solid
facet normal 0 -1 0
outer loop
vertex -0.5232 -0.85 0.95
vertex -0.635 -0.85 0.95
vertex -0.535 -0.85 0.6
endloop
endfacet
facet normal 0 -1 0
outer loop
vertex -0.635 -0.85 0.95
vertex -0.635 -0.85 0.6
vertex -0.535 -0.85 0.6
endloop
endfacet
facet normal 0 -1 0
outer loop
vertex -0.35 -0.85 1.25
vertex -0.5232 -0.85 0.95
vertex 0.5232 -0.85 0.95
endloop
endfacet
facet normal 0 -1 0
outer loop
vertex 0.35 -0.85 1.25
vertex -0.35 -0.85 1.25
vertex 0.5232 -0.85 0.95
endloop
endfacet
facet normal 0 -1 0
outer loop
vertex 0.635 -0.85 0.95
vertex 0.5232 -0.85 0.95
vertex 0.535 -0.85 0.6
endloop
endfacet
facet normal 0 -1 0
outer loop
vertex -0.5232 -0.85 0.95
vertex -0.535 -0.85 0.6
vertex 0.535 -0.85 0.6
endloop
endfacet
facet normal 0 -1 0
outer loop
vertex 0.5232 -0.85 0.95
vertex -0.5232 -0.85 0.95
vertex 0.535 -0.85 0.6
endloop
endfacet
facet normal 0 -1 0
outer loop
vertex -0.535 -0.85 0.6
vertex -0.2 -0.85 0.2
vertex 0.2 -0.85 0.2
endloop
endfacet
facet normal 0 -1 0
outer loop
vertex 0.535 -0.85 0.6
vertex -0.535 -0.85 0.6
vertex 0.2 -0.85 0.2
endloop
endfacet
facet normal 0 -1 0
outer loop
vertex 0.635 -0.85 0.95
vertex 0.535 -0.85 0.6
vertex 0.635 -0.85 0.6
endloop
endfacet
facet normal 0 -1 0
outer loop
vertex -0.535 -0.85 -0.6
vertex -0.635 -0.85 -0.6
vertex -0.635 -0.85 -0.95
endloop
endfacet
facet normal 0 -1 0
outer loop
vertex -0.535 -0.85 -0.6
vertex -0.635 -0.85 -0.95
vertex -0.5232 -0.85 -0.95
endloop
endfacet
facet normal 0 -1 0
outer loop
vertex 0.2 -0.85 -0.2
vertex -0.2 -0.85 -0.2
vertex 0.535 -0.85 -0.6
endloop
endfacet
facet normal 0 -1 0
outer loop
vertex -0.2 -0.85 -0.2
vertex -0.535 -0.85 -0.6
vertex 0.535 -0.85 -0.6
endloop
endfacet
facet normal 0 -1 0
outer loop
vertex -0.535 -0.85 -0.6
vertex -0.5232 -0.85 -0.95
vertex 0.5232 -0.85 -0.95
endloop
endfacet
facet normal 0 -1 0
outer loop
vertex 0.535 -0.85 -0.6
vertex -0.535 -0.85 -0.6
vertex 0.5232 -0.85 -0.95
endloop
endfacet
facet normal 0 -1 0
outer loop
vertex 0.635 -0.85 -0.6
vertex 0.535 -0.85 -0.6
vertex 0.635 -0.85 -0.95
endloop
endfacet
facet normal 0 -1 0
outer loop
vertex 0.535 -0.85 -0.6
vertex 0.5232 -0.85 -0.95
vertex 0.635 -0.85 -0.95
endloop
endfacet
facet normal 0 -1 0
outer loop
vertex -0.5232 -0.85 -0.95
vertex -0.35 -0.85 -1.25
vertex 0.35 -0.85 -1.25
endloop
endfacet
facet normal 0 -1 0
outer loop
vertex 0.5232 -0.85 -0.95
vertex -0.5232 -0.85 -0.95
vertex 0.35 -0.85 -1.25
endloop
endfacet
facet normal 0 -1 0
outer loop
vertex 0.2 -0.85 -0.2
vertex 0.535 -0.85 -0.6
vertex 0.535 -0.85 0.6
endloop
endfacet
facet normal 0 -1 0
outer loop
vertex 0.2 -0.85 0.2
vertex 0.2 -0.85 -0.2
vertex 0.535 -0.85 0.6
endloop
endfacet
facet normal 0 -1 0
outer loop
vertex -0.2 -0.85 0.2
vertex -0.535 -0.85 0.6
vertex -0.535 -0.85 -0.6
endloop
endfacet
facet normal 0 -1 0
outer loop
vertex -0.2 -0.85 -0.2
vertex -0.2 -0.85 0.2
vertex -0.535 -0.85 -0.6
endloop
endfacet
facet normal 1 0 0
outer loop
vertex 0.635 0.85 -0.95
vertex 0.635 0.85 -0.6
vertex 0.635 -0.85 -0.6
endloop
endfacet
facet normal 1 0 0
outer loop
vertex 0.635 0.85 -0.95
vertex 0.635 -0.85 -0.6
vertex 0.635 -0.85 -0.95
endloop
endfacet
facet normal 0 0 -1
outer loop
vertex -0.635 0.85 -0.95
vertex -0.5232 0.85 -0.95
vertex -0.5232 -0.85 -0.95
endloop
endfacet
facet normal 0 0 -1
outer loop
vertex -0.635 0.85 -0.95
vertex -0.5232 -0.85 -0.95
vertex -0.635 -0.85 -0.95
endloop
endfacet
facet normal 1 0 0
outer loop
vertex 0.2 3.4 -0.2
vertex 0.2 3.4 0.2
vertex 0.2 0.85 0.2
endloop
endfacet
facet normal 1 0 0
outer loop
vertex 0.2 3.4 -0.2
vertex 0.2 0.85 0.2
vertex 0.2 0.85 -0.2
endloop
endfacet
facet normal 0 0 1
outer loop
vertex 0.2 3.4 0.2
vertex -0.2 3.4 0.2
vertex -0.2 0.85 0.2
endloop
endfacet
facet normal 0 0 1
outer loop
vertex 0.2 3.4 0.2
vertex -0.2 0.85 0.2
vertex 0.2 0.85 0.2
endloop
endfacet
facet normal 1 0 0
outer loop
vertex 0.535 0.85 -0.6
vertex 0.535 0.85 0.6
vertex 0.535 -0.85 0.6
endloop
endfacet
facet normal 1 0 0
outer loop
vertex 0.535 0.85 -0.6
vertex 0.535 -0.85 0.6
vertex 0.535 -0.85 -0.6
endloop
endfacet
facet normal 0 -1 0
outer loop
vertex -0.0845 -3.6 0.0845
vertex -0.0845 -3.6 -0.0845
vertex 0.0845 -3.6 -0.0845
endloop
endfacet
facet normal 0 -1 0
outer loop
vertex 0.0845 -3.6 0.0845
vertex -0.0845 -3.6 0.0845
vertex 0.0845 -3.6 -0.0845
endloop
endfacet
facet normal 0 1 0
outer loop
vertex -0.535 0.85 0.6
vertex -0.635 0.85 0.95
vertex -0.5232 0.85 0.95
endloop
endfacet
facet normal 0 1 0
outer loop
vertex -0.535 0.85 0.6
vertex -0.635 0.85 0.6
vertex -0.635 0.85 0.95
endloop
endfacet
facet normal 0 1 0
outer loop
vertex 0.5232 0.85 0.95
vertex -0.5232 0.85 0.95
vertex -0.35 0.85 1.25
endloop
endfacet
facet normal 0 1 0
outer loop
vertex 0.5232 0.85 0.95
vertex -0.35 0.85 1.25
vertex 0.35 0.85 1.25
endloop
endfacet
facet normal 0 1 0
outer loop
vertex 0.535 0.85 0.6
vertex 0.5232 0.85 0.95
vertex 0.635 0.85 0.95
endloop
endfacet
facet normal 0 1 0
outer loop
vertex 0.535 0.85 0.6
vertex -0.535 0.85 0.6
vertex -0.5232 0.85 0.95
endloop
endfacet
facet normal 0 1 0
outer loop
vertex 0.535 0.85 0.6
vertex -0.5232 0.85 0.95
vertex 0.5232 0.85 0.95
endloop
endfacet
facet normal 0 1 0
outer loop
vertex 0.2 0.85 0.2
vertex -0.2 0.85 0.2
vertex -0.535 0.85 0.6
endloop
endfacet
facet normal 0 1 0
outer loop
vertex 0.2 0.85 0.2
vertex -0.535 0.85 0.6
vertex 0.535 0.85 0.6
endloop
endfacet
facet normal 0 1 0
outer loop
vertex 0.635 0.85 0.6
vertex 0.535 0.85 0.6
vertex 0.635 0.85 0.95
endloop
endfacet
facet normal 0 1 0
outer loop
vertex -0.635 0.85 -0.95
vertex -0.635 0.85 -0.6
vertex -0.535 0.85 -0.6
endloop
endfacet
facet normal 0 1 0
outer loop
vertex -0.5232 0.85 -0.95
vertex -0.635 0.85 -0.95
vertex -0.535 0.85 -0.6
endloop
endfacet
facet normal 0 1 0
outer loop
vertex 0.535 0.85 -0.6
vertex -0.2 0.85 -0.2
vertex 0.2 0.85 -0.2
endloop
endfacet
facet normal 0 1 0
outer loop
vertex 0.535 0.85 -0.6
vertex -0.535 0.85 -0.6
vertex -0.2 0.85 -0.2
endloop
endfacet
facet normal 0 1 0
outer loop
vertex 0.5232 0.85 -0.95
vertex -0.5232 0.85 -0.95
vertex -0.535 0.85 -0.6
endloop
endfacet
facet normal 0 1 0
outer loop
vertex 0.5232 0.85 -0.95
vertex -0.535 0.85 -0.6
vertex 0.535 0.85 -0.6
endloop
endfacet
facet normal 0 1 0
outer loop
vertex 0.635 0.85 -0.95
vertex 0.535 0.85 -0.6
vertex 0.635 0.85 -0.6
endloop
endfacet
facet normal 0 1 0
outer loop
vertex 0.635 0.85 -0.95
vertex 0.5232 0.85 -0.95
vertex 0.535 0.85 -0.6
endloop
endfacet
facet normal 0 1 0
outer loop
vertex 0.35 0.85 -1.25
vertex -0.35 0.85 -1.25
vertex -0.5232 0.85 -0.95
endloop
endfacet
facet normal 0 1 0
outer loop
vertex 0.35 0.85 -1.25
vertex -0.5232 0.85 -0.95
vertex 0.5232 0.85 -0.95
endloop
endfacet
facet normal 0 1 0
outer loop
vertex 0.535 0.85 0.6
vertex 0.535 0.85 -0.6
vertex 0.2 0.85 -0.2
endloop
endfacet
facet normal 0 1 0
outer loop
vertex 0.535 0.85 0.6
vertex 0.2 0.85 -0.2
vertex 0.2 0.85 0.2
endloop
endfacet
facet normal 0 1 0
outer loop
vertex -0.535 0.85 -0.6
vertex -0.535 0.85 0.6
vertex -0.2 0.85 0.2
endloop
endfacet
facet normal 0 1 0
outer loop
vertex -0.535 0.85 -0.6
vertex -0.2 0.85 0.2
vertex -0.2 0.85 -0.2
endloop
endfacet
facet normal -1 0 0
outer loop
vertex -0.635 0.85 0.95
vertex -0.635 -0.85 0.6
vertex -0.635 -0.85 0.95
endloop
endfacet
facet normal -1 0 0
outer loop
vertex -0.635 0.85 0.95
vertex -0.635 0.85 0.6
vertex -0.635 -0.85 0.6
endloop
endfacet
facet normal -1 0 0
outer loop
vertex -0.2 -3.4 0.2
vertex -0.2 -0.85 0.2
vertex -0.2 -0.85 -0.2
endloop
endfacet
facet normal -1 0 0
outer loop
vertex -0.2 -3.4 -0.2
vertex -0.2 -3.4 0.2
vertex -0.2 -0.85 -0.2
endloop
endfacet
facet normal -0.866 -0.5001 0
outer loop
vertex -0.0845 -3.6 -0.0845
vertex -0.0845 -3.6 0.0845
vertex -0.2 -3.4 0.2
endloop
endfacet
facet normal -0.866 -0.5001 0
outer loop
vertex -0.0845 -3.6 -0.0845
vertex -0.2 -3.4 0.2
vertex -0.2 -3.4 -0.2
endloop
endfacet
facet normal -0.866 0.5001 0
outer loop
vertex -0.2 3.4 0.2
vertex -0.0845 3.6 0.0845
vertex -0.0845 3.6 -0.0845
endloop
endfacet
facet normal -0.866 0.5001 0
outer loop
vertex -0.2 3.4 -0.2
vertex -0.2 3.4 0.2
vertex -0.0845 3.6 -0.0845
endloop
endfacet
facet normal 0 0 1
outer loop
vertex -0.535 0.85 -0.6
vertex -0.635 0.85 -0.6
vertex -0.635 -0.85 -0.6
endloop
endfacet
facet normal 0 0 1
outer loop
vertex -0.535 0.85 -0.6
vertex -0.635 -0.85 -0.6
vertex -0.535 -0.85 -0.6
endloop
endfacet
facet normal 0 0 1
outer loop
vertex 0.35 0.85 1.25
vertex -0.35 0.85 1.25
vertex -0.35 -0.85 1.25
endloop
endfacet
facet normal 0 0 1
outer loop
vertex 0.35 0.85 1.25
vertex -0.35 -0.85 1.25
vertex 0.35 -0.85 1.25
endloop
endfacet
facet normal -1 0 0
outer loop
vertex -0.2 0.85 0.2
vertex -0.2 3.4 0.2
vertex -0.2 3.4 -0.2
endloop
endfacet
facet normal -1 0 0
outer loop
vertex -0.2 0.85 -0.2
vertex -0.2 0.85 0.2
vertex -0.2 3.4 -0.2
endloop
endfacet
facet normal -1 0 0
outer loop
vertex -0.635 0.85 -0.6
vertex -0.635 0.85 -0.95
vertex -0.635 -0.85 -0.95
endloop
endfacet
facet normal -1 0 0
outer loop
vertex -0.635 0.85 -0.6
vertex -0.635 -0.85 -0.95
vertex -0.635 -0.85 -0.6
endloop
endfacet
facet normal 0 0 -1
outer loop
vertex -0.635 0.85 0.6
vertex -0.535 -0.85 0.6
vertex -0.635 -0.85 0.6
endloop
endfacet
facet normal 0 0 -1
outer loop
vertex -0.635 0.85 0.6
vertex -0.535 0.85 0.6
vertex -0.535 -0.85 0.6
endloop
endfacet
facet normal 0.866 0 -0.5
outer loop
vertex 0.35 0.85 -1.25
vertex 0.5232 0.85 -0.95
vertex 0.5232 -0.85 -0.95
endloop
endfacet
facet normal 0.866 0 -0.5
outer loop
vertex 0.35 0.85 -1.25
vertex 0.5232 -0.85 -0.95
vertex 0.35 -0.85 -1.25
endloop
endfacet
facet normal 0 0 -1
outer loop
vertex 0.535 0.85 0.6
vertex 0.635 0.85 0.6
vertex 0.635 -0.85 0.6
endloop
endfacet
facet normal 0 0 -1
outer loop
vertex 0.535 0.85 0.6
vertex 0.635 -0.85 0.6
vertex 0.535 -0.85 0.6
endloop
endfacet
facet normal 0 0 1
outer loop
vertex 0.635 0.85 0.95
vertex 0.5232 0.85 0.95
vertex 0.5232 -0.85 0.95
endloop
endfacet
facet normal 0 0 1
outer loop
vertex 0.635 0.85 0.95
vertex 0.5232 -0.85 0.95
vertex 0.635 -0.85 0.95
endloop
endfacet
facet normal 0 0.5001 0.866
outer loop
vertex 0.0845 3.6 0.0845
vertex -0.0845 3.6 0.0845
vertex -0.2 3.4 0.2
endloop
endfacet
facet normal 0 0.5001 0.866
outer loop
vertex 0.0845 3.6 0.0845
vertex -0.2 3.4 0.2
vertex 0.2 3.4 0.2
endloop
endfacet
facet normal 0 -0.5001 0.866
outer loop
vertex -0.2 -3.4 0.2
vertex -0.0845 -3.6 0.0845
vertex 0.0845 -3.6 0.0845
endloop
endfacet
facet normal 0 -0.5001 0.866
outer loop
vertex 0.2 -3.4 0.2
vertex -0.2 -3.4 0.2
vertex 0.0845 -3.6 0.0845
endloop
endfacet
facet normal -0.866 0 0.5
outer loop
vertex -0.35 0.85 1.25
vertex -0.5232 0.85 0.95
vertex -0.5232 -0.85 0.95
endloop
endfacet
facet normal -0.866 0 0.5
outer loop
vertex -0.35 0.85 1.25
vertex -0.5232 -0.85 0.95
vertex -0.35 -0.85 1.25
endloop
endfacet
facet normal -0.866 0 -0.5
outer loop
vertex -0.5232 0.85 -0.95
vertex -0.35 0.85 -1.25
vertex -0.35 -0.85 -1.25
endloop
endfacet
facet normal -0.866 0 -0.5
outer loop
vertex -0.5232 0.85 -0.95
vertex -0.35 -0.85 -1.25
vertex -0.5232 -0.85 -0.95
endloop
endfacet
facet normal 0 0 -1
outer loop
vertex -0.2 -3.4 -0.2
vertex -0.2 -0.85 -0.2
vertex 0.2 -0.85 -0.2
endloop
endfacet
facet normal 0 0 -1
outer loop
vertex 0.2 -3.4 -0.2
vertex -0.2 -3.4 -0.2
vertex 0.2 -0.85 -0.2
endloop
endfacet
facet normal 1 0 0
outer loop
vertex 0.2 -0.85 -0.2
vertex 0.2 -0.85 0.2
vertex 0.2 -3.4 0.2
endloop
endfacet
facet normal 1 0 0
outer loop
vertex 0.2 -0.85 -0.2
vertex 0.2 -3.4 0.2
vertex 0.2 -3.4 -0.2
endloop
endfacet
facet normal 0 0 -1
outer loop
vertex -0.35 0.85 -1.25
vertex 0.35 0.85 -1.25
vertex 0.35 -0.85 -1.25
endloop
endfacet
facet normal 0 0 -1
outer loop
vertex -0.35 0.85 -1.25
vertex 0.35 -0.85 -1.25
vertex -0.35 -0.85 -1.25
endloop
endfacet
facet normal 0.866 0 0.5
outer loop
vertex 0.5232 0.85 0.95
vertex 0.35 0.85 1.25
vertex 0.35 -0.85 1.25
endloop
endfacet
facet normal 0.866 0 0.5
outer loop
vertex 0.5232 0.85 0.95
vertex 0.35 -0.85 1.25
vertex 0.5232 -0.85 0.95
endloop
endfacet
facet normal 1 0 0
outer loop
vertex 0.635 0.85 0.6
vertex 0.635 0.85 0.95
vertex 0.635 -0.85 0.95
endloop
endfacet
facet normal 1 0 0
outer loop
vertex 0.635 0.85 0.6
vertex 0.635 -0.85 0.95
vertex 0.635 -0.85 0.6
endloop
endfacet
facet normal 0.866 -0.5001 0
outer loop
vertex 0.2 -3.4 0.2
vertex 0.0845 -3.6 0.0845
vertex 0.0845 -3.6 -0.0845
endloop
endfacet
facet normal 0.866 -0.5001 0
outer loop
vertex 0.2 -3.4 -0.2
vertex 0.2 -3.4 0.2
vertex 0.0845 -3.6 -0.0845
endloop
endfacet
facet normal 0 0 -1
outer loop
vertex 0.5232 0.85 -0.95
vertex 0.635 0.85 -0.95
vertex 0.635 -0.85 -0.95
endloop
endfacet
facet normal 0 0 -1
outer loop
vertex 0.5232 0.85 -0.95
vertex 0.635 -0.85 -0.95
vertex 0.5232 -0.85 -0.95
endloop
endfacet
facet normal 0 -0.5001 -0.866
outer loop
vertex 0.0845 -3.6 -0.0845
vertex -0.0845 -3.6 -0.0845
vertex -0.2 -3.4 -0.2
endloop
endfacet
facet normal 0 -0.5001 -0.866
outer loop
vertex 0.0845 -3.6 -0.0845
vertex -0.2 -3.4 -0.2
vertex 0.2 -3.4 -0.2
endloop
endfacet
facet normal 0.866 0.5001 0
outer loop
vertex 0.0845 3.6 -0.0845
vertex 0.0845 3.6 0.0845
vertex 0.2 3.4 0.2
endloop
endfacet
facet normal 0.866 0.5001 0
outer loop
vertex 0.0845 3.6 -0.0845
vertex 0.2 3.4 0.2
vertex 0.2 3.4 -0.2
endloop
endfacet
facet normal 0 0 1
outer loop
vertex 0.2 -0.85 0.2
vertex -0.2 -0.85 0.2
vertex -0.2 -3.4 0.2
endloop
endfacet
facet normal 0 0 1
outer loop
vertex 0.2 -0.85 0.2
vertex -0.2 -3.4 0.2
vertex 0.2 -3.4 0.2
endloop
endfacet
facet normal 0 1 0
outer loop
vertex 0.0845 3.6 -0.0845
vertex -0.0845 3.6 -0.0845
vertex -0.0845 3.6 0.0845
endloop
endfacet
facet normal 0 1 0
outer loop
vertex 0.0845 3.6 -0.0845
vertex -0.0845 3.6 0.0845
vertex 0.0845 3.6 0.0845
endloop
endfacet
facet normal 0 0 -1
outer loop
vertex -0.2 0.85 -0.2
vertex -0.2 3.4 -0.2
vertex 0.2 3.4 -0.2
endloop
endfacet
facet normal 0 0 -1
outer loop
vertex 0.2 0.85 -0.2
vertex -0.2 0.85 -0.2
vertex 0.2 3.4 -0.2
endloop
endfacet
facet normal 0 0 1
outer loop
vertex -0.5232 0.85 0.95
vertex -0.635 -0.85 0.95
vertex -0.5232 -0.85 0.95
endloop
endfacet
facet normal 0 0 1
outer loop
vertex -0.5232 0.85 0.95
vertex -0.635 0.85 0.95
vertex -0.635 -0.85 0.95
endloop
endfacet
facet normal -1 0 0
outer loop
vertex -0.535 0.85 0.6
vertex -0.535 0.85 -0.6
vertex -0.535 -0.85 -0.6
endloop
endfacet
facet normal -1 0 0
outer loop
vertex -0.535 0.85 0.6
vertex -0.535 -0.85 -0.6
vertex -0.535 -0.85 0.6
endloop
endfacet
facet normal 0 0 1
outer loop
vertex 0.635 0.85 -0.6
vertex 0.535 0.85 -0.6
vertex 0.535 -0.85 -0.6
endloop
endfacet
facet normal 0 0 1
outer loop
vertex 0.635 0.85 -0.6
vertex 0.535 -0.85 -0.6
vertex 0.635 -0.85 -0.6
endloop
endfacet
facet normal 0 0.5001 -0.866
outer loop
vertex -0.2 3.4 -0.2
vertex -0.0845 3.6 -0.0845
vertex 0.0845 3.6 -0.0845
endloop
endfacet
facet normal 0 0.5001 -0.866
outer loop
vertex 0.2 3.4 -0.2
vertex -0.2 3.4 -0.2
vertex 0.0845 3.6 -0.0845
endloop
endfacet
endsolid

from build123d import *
from OCP.BRepFilletAPI import BRepFilletAPI_MakeChamfer

# Parameters (mm, degrees)
EXTRUDE_1_DEPTH = 0.85
SKETCH_4_W      = 0.4
SKETCH_4_H      = 0.4
EXTRUDE_2_DEPTH = 3.6
CHAMFER_1_SIZE  = 0.2
CHAMFER_1_SIZE2 = 0.115470054
CHAMFER_2_SIZE  = 0.2
CHAMFER_2_SIZE2 = 0.115470054


with BuildPart() as part:
    # 草图1 → 凸台-拉伸1 (new, symmetric)
    with BuildSketch(Plane(origin=(0, 0, 0), x_dir=(1, 0, 0), z_dir=(0, 1, 0))):
        Polygon((-0.635, -0.95), (-0.523205081, -0.95), (-0.35, -1.25), (0.35, -1.25), (0.523205081, -0.95), (0.635, -0.95), (0.635, -0.6), (0.535, -0.6), (0.535, 0.6), (0.635, 0.6), (0.635, 0.95), (0.523205081, 0.95), (0.35, 1.25), (-0.35, 1.25), (-0.523205081, 0.95), (-0.635, 0.95), (-0.635, 0.6), (-0.535, 0.6), (-0.535, -0.6), (-0.635, -0.6), align=None)
    extrude(amount=EXTRUDE_1_DEPTH, both=True)

    # 草图4 → 凸台-拉伸2 (add, symmetric)
    with BuildSketch(Plane(origin=(0, 0, 0), x_dir=(1, 0, 0), z_dir=(0, 1, 0))):
        Rectangle(SKETCH_4_W, SKETCH_4_H)
    extrude(amount=EXTRUDE_2_DEPTH, both=True)

    # 倒角1: one chamfer whose edges measure the first distance from different faces: ONE call of the kernel's chamfer builder (chamfer() names one face for all edges)
    chamfer_1_edges_1 = [part.edges().sort_by_distance(p)[0] for p in [
        (-0.2, 3.6, 0),
    ]]
    chamfer_1_side_1 = [part.faces().sort_by_distance(p)[0] for p in [
        (-0.2, 2.225, 0),
    ]]
    chamfer_1_edges_2 = [part.edges().sort_by_distance(p)[0] for p in [
        (0, 3.6, 0.2),
    ]]
    chamfer_1_side_2 = [part.faces().sort_by_distance(p)[0] for p in [
        (0, 2.225, 0.2),
    ]]
    chamfer_1_edges_3 = [part.edges().sort_by_distance(p)[0] for p in [
        (0.2, 3.6, 0),
    ]]
    chamfer_1_side_3 = [part.faces().sort_by_distance(p)[0] for p in [
        (0.2, 2.225, 0),
    ]]
    chamfer_1_edges_4 = [part.edges().sort_by_distance(p)[0] for p in [
        (0, 3.6, -0.2),
    ]]
    chamfer_1_side_4 = [part.faces().sort_by_distance(p)[0] for p in [
        (0, 2.225, -0.2),
    ]]
    chamfer_1 = BRepFilletAPI_MakeChamfer(part.part.solid().wrapped)
    for e in chamfer_1_edges_1:
        chamfer_1.Add(CHAMFER_1_SIZE, CHAMFER_1_SIZE2, e.wrapped, chamfer_1_side_1[0].wrapped)  # the first distance lies on this face
    for e in chamfer_1_edges_2:
        chamfer_1.Add(CHAMFER_1_SIZE, CHAMFER_1_SIZE2, e.wrapped, chamfer_1_side_2[0].wrapped)  # the first distance lies on this face
    for e in chamfer_1_edges_3:
        chamfer_1.Add(CHAMFER_1_SIZE, CHAMFER_1_SIZE2, e.wrapped, chamfer_1_side_3[0].wrapped)  # the first distance lies on this face
    for e in chamfer_1_edges_4:
        chamfer_1.Add(CHAMFER_1_SIZE, CHAMFER_1_SIZE2, e.wrapped, chamfer_1_side_4[0].wrapped)  # the first distance lies on this face
    add(Compound.cast(chamfer_1.Shape()), mode=Mode.REPLACE)

    # 倒角2: one chamfer whose edges measure the first distance from different faces: ONE call of the kernel's chamfer builder (chamfer() names one face for all edges)
    chamfer_2_edges_1 = [part.edges().sort_by_distance(p)[0] for p in [
        (-0.2, -3.6, 0),
    ]]
    chamfer_2_side_1 = [part.faces().sort_by_distance(p)[0] for p in [
        (-0.2, -2.225, 0),
    ]]
    chamfer_2_edges_2 = [part.edges().sort_by_distance(p)[0] for p in [
        (0, -3.6, 0.2),
    ]]
    chamfer_2_side_2 = [part.faces().sort_by_distance(p)[0] for p in [
        (0, -2.225, 0.2),
    ]]
    chamfer_2_edges_3 = [part.edges().sort_by_distance(p)[0] for p in [
        (0.2, -3.6, 0),
    ]]
    chamfer_2_side_3 = [part.faces().sort_by_distance(p)[0] for p in [
        (0.2, -2.225, 0),
    ]]
    chamfer_2_edges_4 = [part.edges().sort_by_distance(p)[0] for p in [
        (0, -3.6, -0.2),
    ]]
    chamfer_2_side_4 = [part.faces().sort_by_distance(p)[0] for p in [
        (0, -2.225, -0.2),
    ]]
    chamfer_2 = BRepFilletAPI_MakeChamfer(part.part.solid().wrapped)
    for e in chamfer_2_edges_1:
        chamfer_2.Add(CHAMFER_2_SIZE, CHAMFER_2_SIZE2, e.wrapped, chamfer_2_side_1[0].wrapped)  # the first distance lies on this face
    for e in chamfer_2_edges_2:
        chamfer_2.Add(CHAMFER_2_SIZE, CHAMFER_2_SIZE2, e.wrapped, chamfer_2_side_2[0].wrapped)  # the first distance lies on this face
    for e in chamfer_2_edges_3:
        chamfer_2.Add(CHAMFER_2_SIZE, CHAMFER_2_SIZE2, e.wrapped, chamfer_2_side_3[0].wrapped)  # the first distance lies on this face
    for e in chamfer_2_edges_4:
        chamfer_2.Add(CHAMFER_2_SIZE, CHAMFER_2_SIZE2, e.wrapped, chamfer_2_side_4[0].wrapped)  # the first distance lies on this face
    add(Compound.cast(chamfer_2.Shape()), mode=Mode.REPLACE)


solid = part.part
